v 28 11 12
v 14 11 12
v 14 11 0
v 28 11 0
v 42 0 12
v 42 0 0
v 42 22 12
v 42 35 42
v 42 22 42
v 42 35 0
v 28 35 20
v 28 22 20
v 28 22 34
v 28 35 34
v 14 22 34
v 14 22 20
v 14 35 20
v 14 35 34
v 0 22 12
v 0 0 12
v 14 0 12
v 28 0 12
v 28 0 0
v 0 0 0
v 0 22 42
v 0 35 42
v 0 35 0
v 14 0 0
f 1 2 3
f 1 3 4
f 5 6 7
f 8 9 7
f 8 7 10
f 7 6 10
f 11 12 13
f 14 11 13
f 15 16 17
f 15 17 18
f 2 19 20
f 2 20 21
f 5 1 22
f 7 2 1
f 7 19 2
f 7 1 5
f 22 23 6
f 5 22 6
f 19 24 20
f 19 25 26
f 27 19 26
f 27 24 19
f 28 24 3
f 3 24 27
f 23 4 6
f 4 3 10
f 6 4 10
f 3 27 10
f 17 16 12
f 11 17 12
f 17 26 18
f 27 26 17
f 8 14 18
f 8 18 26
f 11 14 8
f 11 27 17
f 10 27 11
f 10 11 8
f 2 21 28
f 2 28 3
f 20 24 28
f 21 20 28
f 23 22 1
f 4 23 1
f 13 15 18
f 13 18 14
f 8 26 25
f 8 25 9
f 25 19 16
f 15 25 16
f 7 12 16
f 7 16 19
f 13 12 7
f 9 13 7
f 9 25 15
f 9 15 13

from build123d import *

# Parameters (mm, degrees)
F0_W     = 42
F0_H     = 35
F1_DEPTH = 42
F2_W     = 42
F2_H     = 22
F3_DEPTH = 30
F4_W     = 14
F4_H     = 11
F5_DEPTH = 12.001
F6_W     = 14
F6_H     = 14
F7_DEPTH = 13.001


with BuildPart() as f1:
    # F0 (on Top) → F1 (new body)
    with BuildSketch(Plane.XY):
        with Locations((21, 17.5)):
            Rectangle(F0_W, F0_H)
    extrude(amount=F1_DEPTH)

    # F2 (on face) → F3 (cut)
    with BuildSketch(Plane.XY.offset(42)):
        with Locations((21, 11)):
            Rectangle(F2_W, F2_H)
    extrude(amount=-F3_DEPTH, mode=Mode.SUBTRACT)

    # F4 (on face) → F5 (cut, through all)
    with BuildSketch(Plane.XY.offset(12)):
        with Locations((21, 5.5)):
            Rectangle(F4_W, F4_H)
    extrude(amount=-F5_DEPTH, mode=Mode.SUBTRACT)

    # F6 (on face) → F7 (cut, through all)
    with BuildSketch(Plane.XZ.offset(-22)):
        with Locations((21, 27)):
            Rectangle(F6_W, F6_H)
    extrude(amount=-F7_DEPTH, mode=Mode.SUBTRACT)


solid = f1.part
